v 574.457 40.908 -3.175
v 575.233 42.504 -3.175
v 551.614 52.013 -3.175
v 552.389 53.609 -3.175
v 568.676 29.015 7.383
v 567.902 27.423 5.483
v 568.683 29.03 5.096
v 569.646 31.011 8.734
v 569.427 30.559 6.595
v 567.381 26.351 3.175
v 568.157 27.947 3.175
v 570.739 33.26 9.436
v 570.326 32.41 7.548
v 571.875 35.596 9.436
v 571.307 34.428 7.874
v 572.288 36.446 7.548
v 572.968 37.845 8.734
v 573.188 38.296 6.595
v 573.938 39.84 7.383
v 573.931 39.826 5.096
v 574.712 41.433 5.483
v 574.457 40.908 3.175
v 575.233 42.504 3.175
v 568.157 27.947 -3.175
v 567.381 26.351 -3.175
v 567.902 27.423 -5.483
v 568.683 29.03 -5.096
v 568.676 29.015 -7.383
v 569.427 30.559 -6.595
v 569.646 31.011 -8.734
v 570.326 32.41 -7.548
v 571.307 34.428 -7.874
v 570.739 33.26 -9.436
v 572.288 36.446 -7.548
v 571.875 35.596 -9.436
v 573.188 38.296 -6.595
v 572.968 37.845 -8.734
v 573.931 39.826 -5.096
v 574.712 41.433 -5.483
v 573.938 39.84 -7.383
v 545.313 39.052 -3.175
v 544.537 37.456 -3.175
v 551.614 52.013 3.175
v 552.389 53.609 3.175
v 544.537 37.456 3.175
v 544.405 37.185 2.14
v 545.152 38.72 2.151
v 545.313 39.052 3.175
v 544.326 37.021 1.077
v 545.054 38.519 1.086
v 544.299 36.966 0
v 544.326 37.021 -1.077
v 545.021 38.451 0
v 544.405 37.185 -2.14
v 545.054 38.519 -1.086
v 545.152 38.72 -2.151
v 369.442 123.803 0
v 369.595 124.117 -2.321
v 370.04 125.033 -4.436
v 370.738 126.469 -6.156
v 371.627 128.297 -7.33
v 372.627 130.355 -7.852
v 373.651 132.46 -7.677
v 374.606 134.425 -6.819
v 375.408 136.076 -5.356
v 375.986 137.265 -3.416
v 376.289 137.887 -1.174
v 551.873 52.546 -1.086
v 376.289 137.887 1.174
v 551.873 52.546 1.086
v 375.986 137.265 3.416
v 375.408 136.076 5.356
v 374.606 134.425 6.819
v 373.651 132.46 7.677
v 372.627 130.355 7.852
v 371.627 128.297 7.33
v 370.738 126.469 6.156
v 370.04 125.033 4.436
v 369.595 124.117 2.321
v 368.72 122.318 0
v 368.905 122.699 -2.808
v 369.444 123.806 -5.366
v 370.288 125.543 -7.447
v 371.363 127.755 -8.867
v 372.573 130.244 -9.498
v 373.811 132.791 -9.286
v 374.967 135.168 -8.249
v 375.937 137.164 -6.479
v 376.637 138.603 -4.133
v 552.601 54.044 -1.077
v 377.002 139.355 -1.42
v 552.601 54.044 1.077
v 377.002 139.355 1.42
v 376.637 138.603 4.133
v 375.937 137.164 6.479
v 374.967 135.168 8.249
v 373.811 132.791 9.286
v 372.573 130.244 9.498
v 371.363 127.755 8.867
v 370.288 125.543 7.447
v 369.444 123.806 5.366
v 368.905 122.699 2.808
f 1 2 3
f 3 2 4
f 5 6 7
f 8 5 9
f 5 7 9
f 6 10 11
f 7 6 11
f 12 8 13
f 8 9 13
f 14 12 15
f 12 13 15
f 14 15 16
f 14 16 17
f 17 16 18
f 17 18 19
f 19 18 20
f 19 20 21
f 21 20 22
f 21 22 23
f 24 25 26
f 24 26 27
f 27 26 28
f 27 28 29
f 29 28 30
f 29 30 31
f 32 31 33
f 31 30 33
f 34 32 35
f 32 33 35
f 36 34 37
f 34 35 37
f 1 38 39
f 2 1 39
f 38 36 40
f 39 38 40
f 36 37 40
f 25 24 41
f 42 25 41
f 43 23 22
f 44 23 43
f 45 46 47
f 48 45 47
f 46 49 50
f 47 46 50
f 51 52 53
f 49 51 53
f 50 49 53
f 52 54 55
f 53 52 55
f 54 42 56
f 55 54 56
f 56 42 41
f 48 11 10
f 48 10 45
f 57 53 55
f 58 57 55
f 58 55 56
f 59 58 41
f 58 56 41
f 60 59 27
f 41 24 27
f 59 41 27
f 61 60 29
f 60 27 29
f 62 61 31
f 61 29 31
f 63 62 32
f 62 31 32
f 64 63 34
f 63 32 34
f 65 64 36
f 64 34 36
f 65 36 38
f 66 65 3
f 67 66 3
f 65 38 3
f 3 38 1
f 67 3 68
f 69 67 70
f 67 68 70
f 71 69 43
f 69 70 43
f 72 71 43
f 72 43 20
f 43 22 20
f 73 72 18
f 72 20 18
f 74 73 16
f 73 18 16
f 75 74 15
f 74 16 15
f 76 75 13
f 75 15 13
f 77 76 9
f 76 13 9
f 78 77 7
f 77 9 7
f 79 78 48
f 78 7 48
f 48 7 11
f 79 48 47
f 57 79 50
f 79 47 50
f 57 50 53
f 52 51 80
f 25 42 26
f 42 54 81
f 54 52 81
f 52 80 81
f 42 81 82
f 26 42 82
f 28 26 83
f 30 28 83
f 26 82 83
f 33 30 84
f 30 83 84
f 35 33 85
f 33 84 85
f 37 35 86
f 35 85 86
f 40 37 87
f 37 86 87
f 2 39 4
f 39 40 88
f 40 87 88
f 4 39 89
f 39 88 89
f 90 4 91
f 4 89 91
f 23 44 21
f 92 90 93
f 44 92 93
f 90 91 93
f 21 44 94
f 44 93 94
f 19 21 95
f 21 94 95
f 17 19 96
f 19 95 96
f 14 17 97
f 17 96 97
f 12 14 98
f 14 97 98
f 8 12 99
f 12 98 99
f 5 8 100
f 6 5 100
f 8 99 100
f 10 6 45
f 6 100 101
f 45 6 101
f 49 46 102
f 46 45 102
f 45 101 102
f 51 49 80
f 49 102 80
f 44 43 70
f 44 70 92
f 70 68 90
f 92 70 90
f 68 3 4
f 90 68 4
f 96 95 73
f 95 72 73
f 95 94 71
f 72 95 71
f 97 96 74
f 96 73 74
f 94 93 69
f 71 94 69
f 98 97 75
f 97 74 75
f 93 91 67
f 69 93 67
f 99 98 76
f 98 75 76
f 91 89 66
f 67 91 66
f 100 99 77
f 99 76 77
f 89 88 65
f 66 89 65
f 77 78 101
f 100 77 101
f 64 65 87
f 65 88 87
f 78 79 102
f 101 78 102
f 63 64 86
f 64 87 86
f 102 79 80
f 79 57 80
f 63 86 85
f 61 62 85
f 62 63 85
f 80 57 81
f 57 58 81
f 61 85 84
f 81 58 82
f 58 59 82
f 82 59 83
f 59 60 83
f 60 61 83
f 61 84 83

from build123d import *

# Parameters (mm, degrees)
CUT_EXTRUDE1_START = -3.175
CUT_EXTRUDE1_DEPTH = 6.35


with BuildPart() as part:
    # Sketch1 → Revolve1 (revolve)
    with BuildSketch(Plane.XY):
        Polygon((369.442161905, 123.802816275), (567.864710706, 27.346117543), (567.14289772, 25.861265021), (368.720348919, 122.317963753), align=None)
    revolve(axis=Axis((549.918417615, 44.825187693, 0), (0.89936555, -0.437197448, 0)))

    # Sketch2 → Cut-Extrude1 (cut)
    with BuildSketch(Plane.XY.offset(CUT_EXTRUDE1_START)):
        Polygon((552.627624135, 54.098993909), (575.471509095, 42.994178741), (567.14289772, 25.861265021), (544.299012759, 36.966080188), align=None)
    extrude(amount=CUT_EXTRUDE1_DEPTH, mode=Mode.SUBTRACT)


solid = part.part
